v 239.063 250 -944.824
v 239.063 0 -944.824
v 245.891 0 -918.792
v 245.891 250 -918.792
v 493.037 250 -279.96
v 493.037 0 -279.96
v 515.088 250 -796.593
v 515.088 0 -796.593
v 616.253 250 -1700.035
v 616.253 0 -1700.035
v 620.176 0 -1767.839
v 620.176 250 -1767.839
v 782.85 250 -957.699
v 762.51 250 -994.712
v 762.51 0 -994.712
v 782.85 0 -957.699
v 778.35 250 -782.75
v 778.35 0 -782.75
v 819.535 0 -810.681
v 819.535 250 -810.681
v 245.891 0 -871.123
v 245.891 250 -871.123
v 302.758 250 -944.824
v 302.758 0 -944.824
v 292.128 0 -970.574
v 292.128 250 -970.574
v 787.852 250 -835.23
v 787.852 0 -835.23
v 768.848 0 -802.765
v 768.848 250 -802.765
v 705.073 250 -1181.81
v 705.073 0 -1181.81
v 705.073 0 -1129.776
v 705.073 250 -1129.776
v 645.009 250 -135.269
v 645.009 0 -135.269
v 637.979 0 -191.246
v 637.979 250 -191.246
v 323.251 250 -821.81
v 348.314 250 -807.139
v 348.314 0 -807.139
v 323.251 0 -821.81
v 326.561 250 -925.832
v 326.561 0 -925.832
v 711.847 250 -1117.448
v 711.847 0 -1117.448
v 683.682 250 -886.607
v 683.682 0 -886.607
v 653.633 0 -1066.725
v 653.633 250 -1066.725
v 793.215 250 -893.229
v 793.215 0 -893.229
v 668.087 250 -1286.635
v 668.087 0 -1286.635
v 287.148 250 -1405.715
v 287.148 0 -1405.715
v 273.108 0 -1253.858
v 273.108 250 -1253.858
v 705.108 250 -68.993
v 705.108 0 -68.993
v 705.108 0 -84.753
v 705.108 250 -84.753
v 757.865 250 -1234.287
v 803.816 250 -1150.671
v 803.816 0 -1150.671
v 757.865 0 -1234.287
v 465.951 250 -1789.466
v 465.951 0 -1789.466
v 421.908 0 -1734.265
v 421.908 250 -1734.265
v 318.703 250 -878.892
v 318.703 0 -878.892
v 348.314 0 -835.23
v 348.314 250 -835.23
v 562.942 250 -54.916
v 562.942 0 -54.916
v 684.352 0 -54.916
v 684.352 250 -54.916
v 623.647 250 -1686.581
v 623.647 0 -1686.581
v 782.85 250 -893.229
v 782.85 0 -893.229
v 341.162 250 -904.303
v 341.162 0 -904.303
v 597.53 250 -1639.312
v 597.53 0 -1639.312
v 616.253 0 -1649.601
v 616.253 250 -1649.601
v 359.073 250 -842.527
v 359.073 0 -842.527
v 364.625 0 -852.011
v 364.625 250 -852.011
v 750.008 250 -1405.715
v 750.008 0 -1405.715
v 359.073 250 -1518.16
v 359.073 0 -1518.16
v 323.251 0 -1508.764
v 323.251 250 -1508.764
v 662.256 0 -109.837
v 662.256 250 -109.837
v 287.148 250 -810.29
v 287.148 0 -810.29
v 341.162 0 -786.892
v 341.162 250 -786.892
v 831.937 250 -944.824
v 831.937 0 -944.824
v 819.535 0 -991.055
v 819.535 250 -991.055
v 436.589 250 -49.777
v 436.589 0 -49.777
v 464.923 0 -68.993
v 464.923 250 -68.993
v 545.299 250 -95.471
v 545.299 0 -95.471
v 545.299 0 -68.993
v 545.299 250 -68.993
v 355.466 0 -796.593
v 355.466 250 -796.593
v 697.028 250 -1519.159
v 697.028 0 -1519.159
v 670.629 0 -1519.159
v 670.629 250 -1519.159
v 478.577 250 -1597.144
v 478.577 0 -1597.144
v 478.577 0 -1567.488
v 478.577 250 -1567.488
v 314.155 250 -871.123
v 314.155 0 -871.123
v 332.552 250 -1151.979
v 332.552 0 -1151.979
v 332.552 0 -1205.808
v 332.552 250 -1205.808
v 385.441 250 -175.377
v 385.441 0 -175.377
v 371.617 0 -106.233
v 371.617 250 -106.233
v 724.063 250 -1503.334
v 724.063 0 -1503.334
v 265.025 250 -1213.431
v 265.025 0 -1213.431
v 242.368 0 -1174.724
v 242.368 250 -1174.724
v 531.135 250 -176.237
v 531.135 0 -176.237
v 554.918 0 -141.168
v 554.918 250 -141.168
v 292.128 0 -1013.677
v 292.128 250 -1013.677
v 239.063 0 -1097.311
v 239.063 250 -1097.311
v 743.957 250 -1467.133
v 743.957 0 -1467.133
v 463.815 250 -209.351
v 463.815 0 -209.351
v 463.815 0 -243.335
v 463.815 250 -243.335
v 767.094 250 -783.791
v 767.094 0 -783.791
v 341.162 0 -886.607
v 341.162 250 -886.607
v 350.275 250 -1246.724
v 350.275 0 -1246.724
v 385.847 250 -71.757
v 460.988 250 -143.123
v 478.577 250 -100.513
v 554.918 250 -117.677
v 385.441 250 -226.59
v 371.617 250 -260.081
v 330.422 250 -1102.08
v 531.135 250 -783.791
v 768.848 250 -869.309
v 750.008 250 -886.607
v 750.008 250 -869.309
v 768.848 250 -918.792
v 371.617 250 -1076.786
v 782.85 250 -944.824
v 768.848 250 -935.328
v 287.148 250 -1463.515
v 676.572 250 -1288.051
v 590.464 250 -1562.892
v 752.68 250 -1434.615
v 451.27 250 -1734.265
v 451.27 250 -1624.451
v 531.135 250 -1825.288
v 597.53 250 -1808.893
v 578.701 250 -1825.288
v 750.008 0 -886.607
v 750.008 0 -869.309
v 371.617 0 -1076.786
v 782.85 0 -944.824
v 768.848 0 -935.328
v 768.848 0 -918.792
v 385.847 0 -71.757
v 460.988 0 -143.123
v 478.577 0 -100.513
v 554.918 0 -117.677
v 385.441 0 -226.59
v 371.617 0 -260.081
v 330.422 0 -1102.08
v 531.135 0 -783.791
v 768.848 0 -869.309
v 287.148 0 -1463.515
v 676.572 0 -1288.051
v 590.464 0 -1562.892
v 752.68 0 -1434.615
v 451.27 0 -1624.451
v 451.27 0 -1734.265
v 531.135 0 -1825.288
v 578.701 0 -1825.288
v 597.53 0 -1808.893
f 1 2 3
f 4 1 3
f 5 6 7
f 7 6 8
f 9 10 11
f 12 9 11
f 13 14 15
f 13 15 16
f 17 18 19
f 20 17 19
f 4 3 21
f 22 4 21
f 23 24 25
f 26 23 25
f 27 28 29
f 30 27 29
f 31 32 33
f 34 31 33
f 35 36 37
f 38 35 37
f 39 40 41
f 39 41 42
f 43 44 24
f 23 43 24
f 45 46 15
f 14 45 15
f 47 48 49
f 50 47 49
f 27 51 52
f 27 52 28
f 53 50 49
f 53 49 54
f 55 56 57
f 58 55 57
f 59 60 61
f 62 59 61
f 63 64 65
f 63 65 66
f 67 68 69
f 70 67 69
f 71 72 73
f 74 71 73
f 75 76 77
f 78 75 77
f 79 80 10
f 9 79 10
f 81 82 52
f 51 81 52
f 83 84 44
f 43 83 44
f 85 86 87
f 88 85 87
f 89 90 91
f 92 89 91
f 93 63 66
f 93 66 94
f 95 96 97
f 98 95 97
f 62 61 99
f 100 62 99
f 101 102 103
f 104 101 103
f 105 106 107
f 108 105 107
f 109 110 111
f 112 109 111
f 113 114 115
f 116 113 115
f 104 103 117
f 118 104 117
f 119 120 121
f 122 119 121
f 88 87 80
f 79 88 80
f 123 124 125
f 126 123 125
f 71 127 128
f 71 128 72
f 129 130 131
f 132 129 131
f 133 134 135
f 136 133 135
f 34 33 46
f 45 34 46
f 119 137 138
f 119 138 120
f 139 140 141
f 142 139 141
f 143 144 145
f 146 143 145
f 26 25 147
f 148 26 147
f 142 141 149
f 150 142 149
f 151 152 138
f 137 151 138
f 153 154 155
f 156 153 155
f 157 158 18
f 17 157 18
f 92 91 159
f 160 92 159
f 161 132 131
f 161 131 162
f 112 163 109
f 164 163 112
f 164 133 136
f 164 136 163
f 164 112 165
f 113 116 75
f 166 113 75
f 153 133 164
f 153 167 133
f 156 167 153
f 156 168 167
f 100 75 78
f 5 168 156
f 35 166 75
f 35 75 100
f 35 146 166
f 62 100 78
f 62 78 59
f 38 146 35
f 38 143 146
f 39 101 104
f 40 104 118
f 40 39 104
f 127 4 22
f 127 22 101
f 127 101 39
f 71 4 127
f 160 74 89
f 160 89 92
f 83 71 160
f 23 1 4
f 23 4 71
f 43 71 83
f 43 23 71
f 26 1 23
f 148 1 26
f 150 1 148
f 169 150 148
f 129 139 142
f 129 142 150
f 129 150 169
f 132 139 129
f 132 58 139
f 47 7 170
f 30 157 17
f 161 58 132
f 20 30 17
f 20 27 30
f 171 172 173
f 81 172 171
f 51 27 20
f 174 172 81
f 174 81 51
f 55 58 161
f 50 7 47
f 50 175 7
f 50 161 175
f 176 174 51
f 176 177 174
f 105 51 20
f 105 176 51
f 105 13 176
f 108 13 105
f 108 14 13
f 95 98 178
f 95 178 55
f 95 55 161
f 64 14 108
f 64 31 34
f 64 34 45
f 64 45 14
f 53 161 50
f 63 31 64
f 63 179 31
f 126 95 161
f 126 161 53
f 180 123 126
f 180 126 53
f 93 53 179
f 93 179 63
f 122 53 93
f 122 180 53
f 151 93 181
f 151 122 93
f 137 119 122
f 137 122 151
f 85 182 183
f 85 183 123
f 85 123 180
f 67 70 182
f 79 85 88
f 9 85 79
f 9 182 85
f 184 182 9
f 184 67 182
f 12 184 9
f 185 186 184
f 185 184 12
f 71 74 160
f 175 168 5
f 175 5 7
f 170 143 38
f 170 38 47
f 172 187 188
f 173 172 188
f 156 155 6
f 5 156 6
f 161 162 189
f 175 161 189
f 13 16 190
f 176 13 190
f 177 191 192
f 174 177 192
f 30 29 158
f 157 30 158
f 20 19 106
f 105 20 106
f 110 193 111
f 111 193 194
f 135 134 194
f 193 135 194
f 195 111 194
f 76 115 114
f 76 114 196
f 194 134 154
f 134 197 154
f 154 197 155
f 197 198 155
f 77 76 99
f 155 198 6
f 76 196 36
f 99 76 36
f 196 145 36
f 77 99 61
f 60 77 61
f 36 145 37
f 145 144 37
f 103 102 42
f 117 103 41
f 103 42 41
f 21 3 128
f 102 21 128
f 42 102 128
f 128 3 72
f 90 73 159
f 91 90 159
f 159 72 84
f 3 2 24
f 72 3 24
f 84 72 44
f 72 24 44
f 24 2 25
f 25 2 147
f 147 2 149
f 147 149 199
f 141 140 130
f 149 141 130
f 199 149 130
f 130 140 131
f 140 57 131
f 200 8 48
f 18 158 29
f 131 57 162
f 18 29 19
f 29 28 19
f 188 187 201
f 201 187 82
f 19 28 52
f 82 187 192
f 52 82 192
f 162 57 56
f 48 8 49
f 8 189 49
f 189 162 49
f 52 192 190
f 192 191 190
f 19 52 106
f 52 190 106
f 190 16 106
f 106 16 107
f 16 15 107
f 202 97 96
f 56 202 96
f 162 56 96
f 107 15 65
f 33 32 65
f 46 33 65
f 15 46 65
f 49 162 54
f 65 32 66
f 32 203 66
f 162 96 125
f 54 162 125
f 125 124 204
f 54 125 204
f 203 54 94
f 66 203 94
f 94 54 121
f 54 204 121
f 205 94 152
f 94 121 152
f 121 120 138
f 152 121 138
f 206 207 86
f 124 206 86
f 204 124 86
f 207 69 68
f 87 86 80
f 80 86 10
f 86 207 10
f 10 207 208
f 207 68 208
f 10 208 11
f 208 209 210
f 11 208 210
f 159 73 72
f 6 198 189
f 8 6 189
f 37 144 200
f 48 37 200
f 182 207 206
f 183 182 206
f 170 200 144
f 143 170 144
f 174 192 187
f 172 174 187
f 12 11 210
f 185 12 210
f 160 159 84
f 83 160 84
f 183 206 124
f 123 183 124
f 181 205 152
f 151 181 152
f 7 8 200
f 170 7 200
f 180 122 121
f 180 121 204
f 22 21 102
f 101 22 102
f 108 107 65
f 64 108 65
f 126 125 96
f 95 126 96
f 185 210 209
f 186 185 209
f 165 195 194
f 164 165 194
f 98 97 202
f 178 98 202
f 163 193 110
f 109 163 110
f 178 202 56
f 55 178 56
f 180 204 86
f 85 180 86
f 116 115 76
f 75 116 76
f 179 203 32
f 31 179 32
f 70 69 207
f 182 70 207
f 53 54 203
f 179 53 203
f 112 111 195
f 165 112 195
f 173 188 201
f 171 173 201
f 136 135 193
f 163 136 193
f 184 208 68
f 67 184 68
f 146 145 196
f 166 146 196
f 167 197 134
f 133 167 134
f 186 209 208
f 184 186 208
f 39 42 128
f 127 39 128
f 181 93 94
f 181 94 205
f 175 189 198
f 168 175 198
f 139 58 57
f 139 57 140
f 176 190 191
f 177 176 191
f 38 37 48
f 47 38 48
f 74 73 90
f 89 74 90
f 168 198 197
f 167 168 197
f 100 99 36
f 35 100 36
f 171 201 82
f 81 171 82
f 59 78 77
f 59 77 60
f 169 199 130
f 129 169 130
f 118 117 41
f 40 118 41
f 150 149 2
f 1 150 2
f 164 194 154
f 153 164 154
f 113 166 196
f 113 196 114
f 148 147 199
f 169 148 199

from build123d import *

# Parameters (mm, degrees)
BOSS_EXTRUDE1_DEPTH = 250


with BuildPart() as part:
    # Sketch1 → Boss-Extrude1 (new body)
    with BuildSketch(Plane(origin=(0, 0, 0), x_dir=(1, 0, 0), z_dir=(0, 1, 0))):
        Polygon((578.701410648, 1825.287545316), (531.134778167, 1825.287545316), (465.950874397, 1789.465760361), (421.907696174, 1734.264976989), (451.269814989, 1734.264976989), (451.269814989, 1624.450652619), (478.576585488, 1597.143882121), (478.576585488, 1567.488142118), (359.072761909, 1518.159782508), (323.250976955, 1508.763904487), (287.147809461, 1463.514601229), (287.147809461, 1405.715106095), (273.107994721, 1253.858431719), (265.025038466, 1213.430529779), (242.367567897, 1174.724017557), (239.063353439, 1097.310993114), (239.063353439, 944.824114781), (245.891381344, 918.792258395), (245.891381344, 871.122618446), (287.147809461, 810.289637344), (341.161869432, 786.892336921), (355.466219294, 796.593429505), (348.314044363, 807.139376943), (323.250976955, 821.810440791), (314.154839447, 871.122618446), (318.702908201, 878.892235901), (348.314044363, 835.23034444), (359.072761909, 842.52681831), (364.624616217, 852.011236086), (341.161869432, 886.607271102), (341.161869432, 904.30284394), (326.560938876, 925.832049766), (302.757550724, 944.824114781), (292.128472658, 970.574321762), (292.128472658, 1013.676908453), (330.421956406, 1102.079693826), (332.551821838, 1151.979398219), (332.551821838, 1205.807797227), (350.275497983, 1246.723958017), (371.616569608, 1076.785889831), (371.616569608, 895.455057521), (371.616569608, 260.080879685), (385.440948916, 226.589675052), (385.440948916, 175.377140283), (371.616569608, 106.232803304), (385.847432355, 71.756844149), (436.588755582, 49.777196922), (464.923200239, 68.993384557), (478.576585488, 100.513036666), (460.98809069, 143.123259181), (463.814884827, 209.35100752), (463.814884827, 243.335277368), (493.037068607, 279.960414373), (515.088477789, 796.593429505), (531.134778167, 783.790530267), (531.134778167, 176.23713335), (554.918094408, 141.168415737), (554.918094408, 117.677057814), (545.298983692, 95.470768472), (545.298983692, 68.993384557), (562.942285845, 54.916281775), (684.351522986, 54.916281775), (705.108339961, 68.993384557), (705.108339961, 84.753210612), (662.256489638, 109.837220557), (645.00906552, 135.268705377), (637.979365683, 191.245913613), (683.682414799, 886.607271102), (653.632777579, 1066.724980903), (668.086506196, 1286.63513014), (676.572054292, 1288.050802381), (705.072909907, 1181.809528206), (705.072909907, 1129.77568395), (711.847377196, 1117.44837462), (762.510134993, 994.711812576), (782.850389521, 957.699218271), (782.850389521, 944.824114781), (768.84840262, 935.328082274), (768.84840262, 918.792258395), (750.008410059, 886.607271102), (750.008410059, 869.309253594), (768.84840262, 869.309253594), (782.850389521, 893.22931455), (793.214576246, 893.22931455), (787.8523174, 835.23034444), (768.84840262, 802.765323358), (767.094099882, 783.790530267), (778.35036001, 782.749839711), (819.535342519, 810.681156566), (831.937446607, 944.824114781), (819.535342519, 991.054844082), (803.815773154, 1150.671476587), (757.864939322, 1234.286928314), (750.008410059, 1405.715106095), (752.680318314, 1434.614853662), (743.956821075, 1467.133016429), (724.062751494, 1503.333700421), (697.028330439, 1519.15872738), (670.629087918, 1519.15872738), (590.46447955, 1562.891823116), (597.529835452, 1639.311738223), (616.253387999, 1649.601258091), (623.646904415, 1686.580841707), (616.253387999, 1700.034617481), (620.176367687, 1767.839414568), (597.529835452, 1808.892813111), align=None)
    extrude(amount=BOSS_EXTRUDE1_DEPTH)


solid = part.part
